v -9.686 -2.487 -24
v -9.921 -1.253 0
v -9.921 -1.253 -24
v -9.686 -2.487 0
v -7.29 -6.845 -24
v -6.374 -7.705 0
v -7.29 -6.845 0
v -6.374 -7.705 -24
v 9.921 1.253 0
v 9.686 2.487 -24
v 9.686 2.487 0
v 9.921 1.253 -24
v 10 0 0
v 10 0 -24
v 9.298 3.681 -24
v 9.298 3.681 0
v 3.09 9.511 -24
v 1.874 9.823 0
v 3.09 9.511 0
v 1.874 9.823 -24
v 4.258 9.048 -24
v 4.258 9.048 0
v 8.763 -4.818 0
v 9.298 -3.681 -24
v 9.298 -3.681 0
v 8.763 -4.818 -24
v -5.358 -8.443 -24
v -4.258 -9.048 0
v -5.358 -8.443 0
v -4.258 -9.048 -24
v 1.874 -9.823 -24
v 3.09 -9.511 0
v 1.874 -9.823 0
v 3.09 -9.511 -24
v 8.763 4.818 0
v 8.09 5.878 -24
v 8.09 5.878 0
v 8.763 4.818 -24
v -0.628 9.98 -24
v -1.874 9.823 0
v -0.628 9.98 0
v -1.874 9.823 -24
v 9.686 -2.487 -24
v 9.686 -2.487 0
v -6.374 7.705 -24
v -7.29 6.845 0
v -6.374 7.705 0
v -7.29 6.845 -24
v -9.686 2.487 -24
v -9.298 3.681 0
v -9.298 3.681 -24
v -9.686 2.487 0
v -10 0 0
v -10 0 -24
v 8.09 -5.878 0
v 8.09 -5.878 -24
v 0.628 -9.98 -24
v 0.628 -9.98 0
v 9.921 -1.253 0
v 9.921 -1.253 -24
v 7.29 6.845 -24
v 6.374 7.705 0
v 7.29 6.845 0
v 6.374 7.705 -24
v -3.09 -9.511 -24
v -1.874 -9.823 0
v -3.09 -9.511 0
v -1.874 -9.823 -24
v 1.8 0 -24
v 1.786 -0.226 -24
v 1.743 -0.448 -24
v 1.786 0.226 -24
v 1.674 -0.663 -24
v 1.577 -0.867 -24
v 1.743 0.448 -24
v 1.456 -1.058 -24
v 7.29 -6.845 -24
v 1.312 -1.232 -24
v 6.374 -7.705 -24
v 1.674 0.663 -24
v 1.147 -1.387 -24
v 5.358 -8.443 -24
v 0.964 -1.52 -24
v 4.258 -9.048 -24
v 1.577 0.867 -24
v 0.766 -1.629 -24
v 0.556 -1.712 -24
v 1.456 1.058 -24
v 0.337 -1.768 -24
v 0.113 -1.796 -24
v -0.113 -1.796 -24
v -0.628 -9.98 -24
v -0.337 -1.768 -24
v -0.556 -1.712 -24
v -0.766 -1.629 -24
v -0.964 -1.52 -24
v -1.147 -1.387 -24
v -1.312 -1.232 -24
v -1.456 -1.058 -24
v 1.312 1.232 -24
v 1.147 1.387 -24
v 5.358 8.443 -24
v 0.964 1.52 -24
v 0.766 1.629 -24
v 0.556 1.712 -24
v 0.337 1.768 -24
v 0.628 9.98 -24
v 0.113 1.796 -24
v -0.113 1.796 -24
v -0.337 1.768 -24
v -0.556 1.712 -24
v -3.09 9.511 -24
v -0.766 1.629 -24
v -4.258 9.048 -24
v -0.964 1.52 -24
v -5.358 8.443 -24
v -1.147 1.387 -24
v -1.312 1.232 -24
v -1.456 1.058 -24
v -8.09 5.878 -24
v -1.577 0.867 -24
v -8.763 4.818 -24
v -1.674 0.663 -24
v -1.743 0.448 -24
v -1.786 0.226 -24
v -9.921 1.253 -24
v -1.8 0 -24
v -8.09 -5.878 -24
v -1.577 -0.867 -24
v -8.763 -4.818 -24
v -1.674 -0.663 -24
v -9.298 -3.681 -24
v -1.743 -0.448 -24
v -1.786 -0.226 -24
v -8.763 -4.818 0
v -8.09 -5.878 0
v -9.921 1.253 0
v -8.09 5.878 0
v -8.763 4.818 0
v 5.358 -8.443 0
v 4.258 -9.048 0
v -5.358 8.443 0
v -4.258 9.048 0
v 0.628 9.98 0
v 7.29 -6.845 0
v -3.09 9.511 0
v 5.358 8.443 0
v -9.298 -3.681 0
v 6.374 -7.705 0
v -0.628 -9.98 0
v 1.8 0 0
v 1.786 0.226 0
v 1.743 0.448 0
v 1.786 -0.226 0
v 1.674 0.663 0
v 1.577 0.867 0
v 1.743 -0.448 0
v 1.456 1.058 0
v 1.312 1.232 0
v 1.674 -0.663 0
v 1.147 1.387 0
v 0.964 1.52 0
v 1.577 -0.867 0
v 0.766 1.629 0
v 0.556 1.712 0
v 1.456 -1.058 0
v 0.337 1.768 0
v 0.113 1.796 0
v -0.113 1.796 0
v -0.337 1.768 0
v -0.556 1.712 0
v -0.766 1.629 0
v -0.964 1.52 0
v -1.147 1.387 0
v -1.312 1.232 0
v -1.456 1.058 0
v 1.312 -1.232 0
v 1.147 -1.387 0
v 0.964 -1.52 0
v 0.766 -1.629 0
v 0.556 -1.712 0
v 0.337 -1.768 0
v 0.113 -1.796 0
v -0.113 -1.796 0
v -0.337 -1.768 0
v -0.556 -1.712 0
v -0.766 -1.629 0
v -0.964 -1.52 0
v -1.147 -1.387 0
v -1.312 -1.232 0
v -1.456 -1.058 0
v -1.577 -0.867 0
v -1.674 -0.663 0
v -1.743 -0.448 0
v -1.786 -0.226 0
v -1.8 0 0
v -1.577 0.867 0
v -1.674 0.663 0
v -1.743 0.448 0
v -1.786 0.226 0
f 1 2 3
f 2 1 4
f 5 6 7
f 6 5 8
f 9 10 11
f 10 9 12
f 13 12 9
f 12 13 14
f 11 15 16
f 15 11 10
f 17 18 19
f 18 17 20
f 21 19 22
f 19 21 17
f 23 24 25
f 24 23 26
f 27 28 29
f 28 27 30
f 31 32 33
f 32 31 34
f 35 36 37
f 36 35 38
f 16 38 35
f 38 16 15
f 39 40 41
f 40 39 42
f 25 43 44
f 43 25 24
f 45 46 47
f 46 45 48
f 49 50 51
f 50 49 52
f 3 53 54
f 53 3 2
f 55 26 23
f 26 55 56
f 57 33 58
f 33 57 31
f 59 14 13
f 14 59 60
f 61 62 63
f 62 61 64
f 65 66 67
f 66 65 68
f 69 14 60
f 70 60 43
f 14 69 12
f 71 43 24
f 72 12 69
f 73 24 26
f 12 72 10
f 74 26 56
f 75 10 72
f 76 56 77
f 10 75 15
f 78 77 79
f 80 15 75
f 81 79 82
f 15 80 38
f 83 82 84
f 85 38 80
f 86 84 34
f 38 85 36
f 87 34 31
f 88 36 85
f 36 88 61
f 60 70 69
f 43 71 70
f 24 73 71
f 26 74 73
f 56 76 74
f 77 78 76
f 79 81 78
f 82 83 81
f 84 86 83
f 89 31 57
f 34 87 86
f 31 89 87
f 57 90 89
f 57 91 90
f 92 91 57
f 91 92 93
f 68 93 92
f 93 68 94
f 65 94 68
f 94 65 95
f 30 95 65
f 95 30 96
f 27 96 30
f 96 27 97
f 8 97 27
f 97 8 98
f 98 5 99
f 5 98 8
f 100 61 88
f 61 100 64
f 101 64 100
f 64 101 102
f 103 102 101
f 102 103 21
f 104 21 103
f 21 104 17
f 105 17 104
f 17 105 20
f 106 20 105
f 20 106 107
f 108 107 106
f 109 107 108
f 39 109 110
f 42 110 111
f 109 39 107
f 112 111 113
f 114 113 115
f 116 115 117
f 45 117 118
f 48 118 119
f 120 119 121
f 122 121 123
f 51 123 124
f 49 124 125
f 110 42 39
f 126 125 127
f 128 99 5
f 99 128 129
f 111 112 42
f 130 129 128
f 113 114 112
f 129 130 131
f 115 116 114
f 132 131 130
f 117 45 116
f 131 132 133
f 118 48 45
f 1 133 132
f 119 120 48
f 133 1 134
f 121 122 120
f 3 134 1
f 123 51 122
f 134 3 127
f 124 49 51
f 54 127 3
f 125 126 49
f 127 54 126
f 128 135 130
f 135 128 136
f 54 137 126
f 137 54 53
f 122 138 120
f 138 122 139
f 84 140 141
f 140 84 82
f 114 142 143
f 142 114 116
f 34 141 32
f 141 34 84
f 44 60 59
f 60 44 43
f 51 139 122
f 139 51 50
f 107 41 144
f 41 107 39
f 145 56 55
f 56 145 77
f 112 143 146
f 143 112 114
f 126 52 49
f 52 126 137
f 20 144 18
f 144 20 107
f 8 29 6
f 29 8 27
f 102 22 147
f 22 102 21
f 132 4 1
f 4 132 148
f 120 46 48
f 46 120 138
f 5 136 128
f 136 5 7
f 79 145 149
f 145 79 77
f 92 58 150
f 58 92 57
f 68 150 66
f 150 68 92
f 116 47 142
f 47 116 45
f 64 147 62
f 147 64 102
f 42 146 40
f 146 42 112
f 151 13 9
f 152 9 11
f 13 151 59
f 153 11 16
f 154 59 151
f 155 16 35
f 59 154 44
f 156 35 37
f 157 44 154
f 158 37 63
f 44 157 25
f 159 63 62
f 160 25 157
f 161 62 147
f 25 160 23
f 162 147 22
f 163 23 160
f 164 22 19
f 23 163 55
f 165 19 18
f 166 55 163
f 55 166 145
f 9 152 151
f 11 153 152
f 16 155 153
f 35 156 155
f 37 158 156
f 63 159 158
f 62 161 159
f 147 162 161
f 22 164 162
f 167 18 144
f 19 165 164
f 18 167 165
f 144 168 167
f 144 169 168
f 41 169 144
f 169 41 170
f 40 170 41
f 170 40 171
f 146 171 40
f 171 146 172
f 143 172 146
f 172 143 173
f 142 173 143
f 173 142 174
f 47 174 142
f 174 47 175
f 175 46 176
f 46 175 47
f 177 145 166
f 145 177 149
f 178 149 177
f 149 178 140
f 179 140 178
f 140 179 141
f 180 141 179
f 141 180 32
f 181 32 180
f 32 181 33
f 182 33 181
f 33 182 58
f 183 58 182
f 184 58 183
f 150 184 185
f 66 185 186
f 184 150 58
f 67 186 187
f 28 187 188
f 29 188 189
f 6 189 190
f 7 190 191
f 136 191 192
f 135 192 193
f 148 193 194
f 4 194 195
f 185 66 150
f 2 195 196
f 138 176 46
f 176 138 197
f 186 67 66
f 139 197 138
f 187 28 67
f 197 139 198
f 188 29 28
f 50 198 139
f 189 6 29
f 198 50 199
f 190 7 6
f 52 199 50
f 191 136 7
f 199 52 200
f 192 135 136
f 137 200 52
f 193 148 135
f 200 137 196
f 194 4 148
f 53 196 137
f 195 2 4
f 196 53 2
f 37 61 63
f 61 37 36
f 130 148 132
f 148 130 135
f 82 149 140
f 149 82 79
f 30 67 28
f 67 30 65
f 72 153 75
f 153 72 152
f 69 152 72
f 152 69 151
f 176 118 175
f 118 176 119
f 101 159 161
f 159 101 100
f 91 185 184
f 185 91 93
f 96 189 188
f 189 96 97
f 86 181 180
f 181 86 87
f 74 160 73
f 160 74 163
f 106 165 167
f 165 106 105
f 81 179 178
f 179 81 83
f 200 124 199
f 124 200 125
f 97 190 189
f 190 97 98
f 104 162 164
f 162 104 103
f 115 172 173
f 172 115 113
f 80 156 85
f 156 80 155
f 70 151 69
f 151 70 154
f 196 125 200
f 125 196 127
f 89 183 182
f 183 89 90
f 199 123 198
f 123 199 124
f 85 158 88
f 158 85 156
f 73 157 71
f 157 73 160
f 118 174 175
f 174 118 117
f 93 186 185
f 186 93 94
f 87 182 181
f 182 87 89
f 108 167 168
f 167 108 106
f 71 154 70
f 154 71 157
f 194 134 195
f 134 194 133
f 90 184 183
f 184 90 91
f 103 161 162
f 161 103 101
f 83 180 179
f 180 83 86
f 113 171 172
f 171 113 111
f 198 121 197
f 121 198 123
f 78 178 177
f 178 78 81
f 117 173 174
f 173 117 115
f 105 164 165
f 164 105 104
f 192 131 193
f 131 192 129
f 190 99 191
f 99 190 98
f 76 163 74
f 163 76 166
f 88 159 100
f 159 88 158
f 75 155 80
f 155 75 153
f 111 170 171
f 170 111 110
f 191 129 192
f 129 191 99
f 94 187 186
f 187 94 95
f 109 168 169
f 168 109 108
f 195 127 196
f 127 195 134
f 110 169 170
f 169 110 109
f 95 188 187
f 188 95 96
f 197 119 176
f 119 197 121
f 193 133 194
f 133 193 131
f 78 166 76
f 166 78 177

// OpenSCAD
$fn = 50;


difference() {
	union() {
		translate(v = [0, 0, -24.0000000000]) {
			cylinder(h = 24, r = 10.0000000000);
		}
		cylinder(h = 0, r = 13.0000000000);
	}
	union() {
		#translate(v = [0, 0, -24]) {
			cylinder(h = 24, r = 1.8000000000);
		}
	}
}
